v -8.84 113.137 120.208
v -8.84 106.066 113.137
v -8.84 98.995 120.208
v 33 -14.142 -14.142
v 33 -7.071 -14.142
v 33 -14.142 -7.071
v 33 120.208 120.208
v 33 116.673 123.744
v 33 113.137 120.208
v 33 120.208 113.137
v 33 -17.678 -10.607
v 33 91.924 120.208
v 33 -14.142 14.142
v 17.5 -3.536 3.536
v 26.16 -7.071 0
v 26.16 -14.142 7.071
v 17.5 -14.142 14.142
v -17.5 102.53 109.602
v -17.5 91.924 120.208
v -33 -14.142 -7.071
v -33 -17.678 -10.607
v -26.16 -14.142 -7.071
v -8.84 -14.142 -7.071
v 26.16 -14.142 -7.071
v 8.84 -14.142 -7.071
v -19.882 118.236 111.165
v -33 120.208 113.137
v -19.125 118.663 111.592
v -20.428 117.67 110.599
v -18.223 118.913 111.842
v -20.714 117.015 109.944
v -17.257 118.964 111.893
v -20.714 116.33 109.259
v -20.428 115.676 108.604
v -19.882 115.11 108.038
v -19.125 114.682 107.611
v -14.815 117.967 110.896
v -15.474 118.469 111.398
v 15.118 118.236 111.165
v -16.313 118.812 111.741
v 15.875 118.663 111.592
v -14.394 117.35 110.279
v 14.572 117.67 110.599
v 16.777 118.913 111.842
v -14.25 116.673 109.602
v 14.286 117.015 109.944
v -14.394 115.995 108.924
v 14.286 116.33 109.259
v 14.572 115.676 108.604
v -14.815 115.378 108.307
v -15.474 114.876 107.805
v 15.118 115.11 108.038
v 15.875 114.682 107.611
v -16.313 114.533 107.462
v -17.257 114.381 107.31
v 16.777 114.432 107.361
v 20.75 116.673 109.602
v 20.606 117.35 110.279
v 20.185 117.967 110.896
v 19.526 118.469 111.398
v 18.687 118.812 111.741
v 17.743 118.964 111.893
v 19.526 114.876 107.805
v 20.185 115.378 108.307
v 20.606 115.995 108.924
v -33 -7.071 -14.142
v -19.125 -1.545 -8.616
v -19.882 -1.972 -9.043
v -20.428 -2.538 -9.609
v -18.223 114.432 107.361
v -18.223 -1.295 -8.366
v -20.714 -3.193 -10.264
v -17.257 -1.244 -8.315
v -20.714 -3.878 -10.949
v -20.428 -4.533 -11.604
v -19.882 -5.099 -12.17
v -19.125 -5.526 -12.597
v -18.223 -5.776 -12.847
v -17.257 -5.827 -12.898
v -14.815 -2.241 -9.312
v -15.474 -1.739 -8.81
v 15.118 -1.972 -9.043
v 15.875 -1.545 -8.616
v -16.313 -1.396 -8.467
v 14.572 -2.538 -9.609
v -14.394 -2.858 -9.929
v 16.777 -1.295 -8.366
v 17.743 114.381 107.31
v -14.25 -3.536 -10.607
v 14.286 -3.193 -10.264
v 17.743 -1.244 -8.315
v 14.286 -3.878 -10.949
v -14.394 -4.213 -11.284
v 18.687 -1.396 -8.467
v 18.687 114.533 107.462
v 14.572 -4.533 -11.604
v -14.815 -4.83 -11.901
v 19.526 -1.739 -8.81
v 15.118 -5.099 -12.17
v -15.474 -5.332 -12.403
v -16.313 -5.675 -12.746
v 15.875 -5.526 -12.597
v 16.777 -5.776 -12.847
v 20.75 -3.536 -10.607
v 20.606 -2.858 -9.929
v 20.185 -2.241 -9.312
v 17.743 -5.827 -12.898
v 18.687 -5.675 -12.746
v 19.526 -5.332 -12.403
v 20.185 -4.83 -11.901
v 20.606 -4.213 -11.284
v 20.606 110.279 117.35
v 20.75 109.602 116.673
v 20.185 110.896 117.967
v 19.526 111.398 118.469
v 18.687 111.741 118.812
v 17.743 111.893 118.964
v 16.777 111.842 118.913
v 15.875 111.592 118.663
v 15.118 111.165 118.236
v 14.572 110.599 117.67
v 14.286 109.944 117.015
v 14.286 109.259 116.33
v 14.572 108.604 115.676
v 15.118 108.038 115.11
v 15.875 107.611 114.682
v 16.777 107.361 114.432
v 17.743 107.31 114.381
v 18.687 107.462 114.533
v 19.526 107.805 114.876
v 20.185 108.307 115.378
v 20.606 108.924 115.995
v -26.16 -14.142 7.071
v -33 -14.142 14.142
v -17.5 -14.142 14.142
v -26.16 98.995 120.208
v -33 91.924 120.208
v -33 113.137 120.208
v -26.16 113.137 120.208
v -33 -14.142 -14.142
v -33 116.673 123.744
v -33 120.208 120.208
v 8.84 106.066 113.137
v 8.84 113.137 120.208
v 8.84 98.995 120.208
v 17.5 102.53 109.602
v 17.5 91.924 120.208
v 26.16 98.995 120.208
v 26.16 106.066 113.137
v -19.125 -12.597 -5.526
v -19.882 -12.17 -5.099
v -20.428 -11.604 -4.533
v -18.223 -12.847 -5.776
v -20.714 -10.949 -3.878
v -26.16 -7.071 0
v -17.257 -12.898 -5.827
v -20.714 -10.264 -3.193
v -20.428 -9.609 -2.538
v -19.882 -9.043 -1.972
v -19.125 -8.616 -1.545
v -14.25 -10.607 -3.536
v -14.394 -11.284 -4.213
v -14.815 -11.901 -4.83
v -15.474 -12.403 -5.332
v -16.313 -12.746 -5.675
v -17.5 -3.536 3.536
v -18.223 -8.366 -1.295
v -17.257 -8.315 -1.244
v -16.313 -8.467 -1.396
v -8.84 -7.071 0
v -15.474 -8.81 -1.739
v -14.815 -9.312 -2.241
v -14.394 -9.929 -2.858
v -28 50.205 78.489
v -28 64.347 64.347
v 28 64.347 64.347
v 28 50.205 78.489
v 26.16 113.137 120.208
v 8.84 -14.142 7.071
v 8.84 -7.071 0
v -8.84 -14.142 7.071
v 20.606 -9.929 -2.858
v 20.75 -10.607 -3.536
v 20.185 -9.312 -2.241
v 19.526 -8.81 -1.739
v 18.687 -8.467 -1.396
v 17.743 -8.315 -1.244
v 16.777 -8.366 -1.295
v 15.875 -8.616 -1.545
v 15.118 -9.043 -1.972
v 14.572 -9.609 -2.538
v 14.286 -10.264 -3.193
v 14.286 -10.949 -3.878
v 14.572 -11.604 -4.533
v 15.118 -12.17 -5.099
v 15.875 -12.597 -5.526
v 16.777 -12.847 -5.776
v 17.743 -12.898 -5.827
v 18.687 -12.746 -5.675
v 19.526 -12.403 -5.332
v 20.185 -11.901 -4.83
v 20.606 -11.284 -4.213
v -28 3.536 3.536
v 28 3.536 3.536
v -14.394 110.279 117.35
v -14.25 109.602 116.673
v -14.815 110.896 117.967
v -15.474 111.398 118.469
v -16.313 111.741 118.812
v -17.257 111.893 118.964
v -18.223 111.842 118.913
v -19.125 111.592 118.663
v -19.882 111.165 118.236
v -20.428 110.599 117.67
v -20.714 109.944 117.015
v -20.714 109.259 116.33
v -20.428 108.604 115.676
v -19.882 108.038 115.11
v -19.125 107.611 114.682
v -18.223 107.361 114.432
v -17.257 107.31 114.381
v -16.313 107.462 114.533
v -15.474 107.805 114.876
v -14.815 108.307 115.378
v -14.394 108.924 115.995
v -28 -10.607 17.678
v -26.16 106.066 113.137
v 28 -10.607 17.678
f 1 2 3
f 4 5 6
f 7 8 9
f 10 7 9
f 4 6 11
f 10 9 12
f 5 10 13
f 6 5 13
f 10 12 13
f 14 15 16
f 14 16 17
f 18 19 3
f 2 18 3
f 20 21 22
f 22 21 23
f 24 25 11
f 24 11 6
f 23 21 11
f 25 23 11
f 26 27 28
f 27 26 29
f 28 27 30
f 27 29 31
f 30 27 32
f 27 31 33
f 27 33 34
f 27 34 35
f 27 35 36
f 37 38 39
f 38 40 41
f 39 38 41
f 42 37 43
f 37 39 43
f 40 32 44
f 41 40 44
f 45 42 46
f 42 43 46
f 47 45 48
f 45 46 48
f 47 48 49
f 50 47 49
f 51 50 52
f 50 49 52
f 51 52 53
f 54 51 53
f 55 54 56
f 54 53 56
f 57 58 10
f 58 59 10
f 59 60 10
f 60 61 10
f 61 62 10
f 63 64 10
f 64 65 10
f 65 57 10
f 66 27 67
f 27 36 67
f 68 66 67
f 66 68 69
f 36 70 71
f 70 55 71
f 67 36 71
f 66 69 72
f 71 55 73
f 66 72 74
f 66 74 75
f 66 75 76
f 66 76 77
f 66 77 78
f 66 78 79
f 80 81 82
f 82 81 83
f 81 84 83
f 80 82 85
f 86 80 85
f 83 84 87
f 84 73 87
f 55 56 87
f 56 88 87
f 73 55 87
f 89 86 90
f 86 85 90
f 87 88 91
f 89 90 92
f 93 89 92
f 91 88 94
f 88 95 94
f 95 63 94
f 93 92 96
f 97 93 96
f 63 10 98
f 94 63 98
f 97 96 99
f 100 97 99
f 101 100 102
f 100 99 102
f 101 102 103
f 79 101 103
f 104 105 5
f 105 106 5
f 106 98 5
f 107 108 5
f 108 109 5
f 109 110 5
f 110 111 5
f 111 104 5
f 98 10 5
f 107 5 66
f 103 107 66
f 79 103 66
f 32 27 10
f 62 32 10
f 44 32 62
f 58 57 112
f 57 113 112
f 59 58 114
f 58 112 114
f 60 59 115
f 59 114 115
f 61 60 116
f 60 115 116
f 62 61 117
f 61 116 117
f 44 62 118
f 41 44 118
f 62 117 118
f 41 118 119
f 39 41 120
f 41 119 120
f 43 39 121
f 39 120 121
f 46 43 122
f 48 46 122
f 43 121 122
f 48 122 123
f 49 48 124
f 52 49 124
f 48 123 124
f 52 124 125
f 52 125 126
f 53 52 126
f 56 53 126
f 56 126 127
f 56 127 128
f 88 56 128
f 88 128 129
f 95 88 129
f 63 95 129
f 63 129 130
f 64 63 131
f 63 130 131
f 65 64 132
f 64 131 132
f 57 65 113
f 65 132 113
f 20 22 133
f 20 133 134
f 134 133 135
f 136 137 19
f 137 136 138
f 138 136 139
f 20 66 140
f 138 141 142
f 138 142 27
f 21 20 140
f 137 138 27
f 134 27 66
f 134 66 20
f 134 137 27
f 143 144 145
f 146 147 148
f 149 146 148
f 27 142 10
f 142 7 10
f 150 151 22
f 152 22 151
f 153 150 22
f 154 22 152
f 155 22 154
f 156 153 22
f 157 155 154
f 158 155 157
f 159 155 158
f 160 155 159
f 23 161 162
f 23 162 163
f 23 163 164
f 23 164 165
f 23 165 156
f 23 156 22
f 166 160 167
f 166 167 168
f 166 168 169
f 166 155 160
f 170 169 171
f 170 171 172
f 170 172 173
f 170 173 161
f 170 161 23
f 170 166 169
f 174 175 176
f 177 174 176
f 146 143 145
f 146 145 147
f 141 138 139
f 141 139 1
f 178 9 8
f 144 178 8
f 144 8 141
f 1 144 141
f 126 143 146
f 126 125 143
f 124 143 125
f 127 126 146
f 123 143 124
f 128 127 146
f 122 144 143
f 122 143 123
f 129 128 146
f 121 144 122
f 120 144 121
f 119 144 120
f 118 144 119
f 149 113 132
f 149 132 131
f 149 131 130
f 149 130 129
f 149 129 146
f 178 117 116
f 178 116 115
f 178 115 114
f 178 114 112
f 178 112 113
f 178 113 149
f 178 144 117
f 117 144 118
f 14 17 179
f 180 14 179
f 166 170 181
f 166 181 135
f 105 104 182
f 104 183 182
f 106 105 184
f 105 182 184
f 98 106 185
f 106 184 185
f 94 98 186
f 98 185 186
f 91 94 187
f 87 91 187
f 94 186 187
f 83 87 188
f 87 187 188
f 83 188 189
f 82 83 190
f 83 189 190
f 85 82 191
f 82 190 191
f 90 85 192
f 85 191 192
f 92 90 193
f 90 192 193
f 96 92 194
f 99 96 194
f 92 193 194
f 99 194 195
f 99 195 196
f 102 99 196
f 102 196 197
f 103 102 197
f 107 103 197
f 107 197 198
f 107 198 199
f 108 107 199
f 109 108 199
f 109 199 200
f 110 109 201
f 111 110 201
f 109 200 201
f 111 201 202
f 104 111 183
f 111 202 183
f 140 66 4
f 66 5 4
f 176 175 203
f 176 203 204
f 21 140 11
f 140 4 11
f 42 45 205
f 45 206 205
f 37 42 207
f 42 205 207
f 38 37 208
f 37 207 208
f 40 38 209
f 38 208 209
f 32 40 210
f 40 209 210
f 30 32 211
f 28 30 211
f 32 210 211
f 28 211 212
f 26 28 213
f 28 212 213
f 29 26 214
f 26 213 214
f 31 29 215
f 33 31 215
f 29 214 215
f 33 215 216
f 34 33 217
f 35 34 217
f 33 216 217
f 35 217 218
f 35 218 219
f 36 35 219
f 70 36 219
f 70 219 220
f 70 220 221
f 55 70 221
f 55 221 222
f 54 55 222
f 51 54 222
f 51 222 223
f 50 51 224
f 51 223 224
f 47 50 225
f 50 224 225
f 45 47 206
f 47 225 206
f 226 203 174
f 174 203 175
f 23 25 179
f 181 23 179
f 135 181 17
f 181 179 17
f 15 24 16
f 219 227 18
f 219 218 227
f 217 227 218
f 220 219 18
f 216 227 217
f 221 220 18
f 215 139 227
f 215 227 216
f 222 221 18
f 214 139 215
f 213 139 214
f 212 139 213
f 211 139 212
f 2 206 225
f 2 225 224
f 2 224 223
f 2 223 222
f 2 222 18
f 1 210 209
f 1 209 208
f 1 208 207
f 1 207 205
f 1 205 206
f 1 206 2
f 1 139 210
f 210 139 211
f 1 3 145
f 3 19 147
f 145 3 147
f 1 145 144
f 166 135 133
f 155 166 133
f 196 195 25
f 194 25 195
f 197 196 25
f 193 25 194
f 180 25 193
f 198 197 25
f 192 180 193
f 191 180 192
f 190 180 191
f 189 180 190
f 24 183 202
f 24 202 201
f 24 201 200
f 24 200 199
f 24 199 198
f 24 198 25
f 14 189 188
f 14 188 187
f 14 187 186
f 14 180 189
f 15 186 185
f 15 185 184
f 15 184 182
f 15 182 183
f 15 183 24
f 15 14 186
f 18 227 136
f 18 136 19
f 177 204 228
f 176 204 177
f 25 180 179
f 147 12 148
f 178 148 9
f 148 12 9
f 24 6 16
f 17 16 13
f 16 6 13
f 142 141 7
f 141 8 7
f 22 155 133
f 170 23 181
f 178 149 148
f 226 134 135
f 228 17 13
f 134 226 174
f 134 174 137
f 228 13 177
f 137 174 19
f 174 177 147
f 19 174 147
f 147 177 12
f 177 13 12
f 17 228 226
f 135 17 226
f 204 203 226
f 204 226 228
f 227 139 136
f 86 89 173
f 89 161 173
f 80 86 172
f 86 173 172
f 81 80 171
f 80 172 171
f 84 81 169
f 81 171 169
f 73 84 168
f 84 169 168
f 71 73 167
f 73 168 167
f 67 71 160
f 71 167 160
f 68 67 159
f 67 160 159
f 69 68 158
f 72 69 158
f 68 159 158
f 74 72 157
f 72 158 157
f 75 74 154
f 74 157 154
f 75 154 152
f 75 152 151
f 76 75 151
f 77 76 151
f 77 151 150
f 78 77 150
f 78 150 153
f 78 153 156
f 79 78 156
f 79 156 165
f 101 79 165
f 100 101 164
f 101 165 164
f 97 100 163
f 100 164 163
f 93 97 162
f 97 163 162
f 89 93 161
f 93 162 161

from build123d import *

# Parameters (mm, degrees)
PAD_DEPTH            = 33
SKETCH001_W          = 56
SKETCH001_H          = 86
POCKET_DEPTH         = 100.001
SKETCH003_R          = 3.25
POCKET001_DEPTH      = 95.001
POCKET001_DEPTH_BACK = 100.001
POCKET002_DEPTH      = 95.001


with BuildPart() as part:
    # Sketch002 → Pad (new body, symmetric)
    with BuildSketch(Plane.YZ):
        Polygon((-14.1421356237, 14.1421356237), (91.9238815543, 120.2081528017), (113.1370849898, 120.2081528017), (116.6726188958, 123.7436867076), (120.2081528017, 120.2081528017), (120.2081528017, 113.1370849898), (-7.0710678119, -14.1421356237), (-14.1421356237, -14.1421356237), (-17.6776695297, -10.6066017178), (-14.1421356237, -7.0710678119), align=None)
    extrude(amount=PAD_DEPTH, both=True)

    # Sketch001 (on DatumPlane) → Pocket (cut, through all)
    with BuildSketch(Plane(origin=(0, 0, 0), x_dir=(1, 0, 0), z_dir=(0, -0.7071067812, 0.7071067812))):
        with Locations((0, 48)):
            Rectangle(SKETCH001_W, SKETCH001_H)
    extrude(amount=POCKET_DEPTH, mode=Mode.SUBTRACT)

    # Sketch003 (on DatumPlane) → Pocket001 (cut, two sides)
    with BuildSketch(Plane(origin=(0, 0, 0), x_dir=(1, 0, 0), z_dir=(0, -0.7071067812, 0.7071067812))) as pocket001_sk:
        with Locations((-17.5, 160)):
            Circle(SKETCH003_R)
        with Locations((17.5, 160)):
            Circle(SKETCH003_R)
        with Locations((-17.5, -10)):
            Circle(SKETCH003_R)
        with Locations((17.5, -10)):
            Circle(SKETCH003_R)
    extrude(amount=-POCKET001_DEPTH, mode=Mode.SUBTRACT)
    extrude(pocket001_sk.sketch, amount=POCKET001_DEPTH_BACK, mode=Mode.SUBTRACT)

    # Sketch004 (on DatumPlane) → Pocket002 (cut, through all)
    with BuildSketch(Plane(origin=(0, -3.5355339059, 3.5355339059), x_dir=(1, 0, 0), z_dir=(0, -0.7071067812, 0.7071067812))):
        Polygon((-17.5, 170), (-26.1602540378, 165), (-26.1602540378, 155), (-17.5, 150), (-8.8397459622, 155), (-8.8397459622, 165), align=None)
        Polygon((17.5, 170), (8.8397459622, 165), (8.8397459622, 155), (17.5, 150), (26.1602540378, 155), (26.1602540378, 165), align=None)
        Polygon((17.5, 0), (8.8397459622, -5), (8.8397459622, -15), (17.5, -20), (26.1602540378, -15), (26.1602540378, -5), align=None)
        Polygon((-17.5, 0), (-26.1602540378, -5), (-26.1602540378, -15), (-17.5, -20), (-8.8397459622, -15), (-8.8397459622, -5), align=None)
    extrude(amount=POCKET002_DEPTH, mode=Mode.SUBTRACT)


solid = part.part
